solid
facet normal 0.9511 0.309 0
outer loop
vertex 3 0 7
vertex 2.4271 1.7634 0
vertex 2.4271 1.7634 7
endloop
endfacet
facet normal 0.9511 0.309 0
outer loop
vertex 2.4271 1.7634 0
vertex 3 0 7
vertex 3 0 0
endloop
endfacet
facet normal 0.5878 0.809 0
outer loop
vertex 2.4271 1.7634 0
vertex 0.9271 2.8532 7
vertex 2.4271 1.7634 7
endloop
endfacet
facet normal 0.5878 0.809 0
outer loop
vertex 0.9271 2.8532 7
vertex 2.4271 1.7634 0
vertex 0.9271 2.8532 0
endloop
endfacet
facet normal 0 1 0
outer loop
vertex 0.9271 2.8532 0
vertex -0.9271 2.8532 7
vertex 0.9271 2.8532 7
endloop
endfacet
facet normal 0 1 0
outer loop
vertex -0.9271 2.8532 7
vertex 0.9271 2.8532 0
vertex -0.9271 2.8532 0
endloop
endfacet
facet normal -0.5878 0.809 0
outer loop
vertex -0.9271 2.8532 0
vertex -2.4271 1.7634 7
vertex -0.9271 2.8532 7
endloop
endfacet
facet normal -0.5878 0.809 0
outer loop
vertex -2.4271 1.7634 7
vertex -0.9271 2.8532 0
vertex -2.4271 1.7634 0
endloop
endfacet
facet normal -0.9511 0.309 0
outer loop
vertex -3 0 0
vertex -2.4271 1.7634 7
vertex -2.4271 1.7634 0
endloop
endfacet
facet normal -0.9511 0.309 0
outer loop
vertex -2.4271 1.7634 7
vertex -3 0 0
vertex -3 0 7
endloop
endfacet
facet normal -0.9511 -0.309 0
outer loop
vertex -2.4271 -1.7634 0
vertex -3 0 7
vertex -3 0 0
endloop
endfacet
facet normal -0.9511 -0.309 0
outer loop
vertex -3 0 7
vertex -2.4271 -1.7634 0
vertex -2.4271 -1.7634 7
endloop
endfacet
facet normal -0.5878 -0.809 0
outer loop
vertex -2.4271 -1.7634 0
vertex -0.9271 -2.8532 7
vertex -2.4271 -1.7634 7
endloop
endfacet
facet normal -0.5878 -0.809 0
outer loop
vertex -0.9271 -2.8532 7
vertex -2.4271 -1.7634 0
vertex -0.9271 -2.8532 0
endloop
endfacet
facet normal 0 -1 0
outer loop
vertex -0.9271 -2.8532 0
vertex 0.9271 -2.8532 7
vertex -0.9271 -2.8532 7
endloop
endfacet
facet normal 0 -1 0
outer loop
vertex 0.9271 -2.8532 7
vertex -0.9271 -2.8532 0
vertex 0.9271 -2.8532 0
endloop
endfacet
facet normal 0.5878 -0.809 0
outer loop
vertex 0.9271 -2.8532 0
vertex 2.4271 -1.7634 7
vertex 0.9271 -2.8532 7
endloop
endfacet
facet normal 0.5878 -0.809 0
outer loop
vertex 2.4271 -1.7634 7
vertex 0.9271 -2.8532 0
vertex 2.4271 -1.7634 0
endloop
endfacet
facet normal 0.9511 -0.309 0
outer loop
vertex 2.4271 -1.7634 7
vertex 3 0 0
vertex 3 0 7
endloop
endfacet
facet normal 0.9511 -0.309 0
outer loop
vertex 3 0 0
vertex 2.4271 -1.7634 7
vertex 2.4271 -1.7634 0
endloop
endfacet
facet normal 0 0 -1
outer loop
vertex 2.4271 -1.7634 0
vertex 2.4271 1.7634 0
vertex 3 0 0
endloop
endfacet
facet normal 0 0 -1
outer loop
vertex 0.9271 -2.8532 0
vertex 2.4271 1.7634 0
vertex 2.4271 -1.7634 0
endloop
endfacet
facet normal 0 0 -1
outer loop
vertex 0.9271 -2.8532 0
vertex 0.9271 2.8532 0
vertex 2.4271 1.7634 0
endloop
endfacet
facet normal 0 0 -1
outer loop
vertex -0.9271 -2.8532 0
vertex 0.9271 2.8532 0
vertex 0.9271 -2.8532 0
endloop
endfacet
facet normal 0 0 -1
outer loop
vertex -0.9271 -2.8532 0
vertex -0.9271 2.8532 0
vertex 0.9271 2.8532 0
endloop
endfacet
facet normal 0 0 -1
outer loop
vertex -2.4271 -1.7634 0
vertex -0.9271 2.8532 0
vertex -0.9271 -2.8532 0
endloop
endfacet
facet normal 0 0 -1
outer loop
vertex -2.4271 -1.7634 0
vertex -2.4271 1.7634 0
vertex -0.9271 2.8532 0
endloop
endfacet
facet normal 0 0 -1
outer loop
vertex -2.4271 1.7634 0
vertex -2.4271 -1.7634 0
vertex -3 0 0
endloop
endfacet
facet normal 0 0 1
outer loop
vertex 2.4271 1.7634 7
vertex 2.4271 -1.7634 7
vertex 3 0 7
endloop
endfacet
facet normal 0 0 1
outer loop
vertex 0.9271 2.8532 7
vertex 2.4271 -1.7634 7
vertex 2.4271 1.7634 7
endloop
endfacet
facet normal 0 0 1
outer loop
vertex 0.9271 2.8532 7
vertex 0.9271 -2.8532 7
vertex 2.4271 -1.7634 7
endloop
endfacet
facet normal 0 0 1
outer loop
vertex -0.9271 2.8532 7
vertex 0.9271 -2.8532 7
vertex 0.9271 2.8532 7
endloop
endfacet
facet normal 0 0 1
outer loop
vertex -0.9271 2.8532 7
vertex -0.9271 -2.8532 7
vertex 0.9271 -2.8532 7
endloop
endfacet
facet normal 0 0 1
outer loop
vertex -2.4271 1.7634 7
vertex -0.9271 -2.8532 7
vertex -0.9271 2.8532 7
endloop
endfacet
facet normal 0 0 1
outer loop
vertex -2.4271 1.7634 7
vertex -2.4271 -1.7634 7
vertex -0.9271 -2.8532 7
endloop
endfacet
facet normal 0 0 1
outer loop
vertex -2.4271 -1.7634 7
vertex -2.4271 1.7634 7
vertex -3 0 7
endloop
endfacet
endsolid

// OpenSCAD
// Generated by SolidPython 1.0.1 on 2020-07-29 00:46:44


cylinder(h = 7, r1 = 3, r2 = 3);
/***********************************************
*********      SolidPython code:      **********
************************************************
 
# import packages: SolidPython
from solid import *
from solid.utils import *
from itertools import chain, combinations, permutations


class Resize:

    def __init__(self, scad_file):
        self.scad_file = scad_file
        #self.scad_file = import_scad(scad_file)
        # cone/cylinder param:
        self.r1 = 0
        self.r2 = 0
        self.h = 0
        # rectangular prism param:
        self.w = 0
        self.l = 0
        # ellipse param:
        self.r = 0

    # import OpenScad code (file name corresponds to shape)


    # classify shape + parameters
    def assign(self, param1, param2, param3):
        if self.scad_file == 'cone.scad':
            self.r1 = param1
            self.r2 = param2
            self.h = param3
        elif self.scad_file == 'cylinder.scad':
            self.r1 = param1
            self.r2 = param2
            self.h = param3
        elif self.scad_file == 'rectangularPrism.scad':
            self.h = param1
            self.l = param2
            self.w = param3
        else:
            self.r = param1
            self.h = param2

    # resize parameters
    def iterate(self):
        x = range(3, 20, 2)
        i = 1
        if self.scad_file == 'cone.scad':
            tempList = list(permutations(x, 2))
            for temp in tempList:
                param1 = temp[0]
                param2 = temp[1]
                filepath = 'produced_scad_files/' + 'cone' + str(param1) + '_' + str(param2) + '_' + '.scad'
                scad_render_to_file(cylinder(h=param1, r1=param2, r2=0), filepath)

        elif self.scad_file == 'cylinder.scad':
            tempList = list(permutations(x, 3))
            for temp in tempList:
                param1 = temp[0]
                param2 = temp[1]
                filepath = 'produced_scad_files/' + 'cylinder' + str(param1) + '_' + str(param2) + '_' + '.scad'
                scad_render_to_file(cylinder(h=param1, r1=param2, r2=param2), filepath)

        elif self.scad_file == 'rectangularPrism.scad':
            tempList = list(permutations(x, 3))
            for temp in tempList:
                param1 = temp[0]
                param2 = temp[1]
                param3 = temp[2]
                filepath = 'produced_scad_files/' + 'rectangularPrism' + str(param1) + '_' + str(param2) + '_' + str(
                    param3) + '.scad'
                scad_render_to_file(cube(size=(param1, param2, param3)), filepath)

        elif self.scad_file == 'ellipse.scad':
            tempList = list(permutations(x, 4))
            for temp in tempList:
                param1 = temp[0]
                param2 = temp[1]
                param3 = temp[2]
                param4 = temp[3]
                filepath = 'produced_scad_files/' + 'ellipse' + str(param1) + '_' + str(param2) + '_' + str(param3) + '_' + str(param4) + '.scad'
                scad_render_to_file(scale([param1, param2, param3])(sphere(r=param4)), filepath)

    def render_to_scadfile(self):
        scad_render_to_file(scad, 'example.scad') 
 
************************************************/
